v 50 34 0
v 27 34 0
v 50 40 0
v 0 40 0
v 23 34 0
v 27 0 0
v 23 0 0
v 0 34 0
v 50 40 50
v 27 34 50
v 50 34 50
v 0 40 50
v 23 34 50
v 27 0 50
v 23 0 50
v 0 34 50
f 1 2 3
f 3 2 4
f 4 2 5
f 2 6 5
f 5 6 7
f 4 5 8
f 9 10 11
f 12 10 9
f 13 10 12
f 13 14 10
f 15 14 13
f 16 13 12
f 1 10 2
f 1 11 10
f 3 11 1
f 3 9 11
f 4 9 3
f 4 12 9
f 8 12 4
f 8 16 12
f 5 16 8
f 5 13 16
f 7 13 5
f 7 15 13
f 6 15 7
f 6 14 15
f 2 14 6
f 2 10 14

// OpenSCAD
$fn = 32;

// ----------------------------------------------------------------------
// Structural section: tee 50 x 40 mm
// ----------------------------------------------------------------------

// --- parameters (mm) ---
sec_w = 50;               // tee width, X
sec_h = 40;               // tee height, Y
flange_t = 6;             // top flange thickness
web_t = 4;                // web thickness
plate_t = 50;             // cut length, Z (extrusion height)

profile = [[23, 0], [27, 0], [27, 34], [50, 34], [50, 40], [0, 40], [0, 34], [23, 34]];  // primary outline, 8 points, counter clockwise

// --- the one profile operation ---
linear_extrude(height = plate_t) polygon(points = profile);
